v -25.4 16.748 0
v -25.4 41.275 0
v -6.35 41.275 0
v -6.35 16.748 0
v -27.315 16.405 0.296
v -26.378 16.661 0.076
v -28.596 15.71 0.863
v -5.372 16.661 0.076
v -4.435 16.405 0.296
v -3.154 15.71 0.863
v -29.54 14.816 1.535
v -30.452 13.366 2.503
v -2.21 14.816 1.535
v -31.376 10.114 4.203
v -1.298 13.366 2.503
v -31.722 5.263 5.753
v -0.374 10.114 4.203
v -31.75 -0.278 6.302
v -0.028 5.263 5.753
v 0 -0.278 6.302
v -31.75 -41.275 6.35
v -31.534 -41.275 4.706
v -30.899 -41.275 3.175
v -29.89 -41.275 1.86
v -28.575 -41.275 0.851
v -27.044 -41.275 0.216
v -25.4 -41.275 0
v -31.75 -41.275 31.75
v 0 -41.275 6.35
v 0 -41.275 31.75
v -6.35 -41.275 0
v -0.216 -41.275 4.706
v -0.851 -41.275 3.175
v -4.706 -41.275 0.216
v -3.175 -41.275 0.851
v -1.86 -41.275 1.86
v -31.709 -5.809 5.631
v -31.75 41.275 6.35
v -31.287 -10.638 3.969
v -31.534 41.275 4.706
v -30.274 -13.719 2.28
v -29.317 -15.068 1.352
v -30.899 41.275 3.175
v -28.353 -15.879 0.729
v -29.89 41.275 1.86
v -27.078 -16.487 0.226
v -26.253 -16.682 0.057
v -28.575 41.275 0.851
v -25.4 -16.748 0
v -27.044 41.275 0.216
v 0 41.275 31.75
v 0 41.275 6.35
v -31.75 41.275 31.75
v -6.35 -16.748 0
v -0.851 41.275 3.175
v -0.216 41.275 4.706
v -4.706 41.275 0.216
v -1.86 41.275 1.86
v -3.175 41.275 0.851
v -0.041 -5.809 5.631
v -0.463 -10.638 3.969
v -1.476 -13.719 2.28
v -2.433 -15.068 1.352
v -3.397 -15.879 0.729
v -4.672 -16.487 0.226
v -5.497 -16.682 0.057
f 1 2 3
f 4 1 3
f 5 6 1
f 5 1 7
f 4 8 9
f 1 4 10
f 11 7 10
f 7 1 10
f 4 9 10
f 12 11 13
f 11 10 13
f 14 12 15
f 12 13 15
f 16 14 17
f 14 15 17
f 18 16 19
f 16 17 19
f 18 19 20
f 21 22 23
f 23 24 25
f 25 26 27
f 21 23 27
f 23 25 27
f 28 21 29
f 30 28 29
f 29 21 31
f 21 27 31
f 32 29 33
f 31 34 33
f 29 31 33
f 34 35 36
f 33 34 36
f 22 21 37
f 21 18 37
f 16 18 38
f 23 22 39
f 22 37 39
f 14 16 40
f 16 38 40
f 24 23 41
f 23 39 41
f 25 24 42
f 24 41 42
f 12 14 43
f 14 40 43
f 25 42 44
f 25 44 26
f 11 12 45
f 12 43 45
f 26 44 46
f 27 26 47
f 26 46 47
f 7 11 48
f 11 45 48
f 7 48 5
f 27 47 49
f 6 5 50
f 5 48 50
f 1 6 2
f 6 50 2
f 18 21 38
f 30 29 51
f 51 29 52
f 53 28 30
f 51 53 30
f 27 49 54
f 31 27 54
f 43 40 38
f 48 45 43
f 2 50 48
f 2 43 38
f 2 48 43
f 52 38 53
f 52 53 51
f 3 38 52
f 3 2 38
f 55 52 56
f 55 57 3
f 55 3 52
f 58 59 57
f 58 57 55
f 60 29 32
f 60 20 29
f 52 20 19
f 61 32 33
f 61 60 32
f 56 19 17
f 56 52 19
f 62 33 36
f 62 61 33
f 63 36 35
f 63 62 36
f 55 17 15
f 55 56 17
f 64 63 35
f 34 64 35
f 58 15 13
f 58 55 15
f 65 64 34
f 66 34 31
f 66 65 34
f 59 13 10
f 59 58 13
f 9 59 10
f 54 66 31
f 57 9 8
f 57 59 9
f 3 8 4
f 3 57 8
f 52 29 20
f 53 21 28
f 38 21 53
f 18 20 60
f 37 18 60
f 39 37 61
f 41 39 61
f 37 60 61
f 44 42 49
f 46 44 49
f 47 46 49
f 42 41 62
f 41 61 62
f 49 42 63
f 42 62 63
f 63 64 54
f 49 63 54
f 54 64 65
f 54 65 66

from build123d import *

# Parameters (mm, degrees)
F0_W     = 31.75
F0_H     = 82.55
F1_DEPTH = 31.75
F2_R     = 6.35
F4_DEPTH = 31.75


with BuildPart() as f1:
    # F0 (on Top) → F1 (new body)
    with BuildSketch(Plane.XY):
        with Locations((-15.875, 0)):
            Rectangle(F0_W, F0_H)
    extrude(amount=F1_DEPTH)

    # F2
    f2_edges = [f1.edges().sort_by_distance(p)[0] for p in [
        (0, 0, 0),
        (-31.75, 0, 0),
    ]]
    fillet(f2_edges, radius=F2_R)

    # F3 (on face) → F4 (cut)
    with BuildSketch(Plane.YZ):
        with BuildLine():
            ThreePointArc((-17.107905, -0.321605), (9.302694, -42.731185), (-0.278371, 6.302431))
            ThreePointArc((-0.278371, 6.302431), (-9.302694, 4.539097), (-17.107905, -0.321605))
        make_face()
    extrude(amount=-F4_DEPTH, mode=Mode.SUBTRACT)


solid = f1.part
